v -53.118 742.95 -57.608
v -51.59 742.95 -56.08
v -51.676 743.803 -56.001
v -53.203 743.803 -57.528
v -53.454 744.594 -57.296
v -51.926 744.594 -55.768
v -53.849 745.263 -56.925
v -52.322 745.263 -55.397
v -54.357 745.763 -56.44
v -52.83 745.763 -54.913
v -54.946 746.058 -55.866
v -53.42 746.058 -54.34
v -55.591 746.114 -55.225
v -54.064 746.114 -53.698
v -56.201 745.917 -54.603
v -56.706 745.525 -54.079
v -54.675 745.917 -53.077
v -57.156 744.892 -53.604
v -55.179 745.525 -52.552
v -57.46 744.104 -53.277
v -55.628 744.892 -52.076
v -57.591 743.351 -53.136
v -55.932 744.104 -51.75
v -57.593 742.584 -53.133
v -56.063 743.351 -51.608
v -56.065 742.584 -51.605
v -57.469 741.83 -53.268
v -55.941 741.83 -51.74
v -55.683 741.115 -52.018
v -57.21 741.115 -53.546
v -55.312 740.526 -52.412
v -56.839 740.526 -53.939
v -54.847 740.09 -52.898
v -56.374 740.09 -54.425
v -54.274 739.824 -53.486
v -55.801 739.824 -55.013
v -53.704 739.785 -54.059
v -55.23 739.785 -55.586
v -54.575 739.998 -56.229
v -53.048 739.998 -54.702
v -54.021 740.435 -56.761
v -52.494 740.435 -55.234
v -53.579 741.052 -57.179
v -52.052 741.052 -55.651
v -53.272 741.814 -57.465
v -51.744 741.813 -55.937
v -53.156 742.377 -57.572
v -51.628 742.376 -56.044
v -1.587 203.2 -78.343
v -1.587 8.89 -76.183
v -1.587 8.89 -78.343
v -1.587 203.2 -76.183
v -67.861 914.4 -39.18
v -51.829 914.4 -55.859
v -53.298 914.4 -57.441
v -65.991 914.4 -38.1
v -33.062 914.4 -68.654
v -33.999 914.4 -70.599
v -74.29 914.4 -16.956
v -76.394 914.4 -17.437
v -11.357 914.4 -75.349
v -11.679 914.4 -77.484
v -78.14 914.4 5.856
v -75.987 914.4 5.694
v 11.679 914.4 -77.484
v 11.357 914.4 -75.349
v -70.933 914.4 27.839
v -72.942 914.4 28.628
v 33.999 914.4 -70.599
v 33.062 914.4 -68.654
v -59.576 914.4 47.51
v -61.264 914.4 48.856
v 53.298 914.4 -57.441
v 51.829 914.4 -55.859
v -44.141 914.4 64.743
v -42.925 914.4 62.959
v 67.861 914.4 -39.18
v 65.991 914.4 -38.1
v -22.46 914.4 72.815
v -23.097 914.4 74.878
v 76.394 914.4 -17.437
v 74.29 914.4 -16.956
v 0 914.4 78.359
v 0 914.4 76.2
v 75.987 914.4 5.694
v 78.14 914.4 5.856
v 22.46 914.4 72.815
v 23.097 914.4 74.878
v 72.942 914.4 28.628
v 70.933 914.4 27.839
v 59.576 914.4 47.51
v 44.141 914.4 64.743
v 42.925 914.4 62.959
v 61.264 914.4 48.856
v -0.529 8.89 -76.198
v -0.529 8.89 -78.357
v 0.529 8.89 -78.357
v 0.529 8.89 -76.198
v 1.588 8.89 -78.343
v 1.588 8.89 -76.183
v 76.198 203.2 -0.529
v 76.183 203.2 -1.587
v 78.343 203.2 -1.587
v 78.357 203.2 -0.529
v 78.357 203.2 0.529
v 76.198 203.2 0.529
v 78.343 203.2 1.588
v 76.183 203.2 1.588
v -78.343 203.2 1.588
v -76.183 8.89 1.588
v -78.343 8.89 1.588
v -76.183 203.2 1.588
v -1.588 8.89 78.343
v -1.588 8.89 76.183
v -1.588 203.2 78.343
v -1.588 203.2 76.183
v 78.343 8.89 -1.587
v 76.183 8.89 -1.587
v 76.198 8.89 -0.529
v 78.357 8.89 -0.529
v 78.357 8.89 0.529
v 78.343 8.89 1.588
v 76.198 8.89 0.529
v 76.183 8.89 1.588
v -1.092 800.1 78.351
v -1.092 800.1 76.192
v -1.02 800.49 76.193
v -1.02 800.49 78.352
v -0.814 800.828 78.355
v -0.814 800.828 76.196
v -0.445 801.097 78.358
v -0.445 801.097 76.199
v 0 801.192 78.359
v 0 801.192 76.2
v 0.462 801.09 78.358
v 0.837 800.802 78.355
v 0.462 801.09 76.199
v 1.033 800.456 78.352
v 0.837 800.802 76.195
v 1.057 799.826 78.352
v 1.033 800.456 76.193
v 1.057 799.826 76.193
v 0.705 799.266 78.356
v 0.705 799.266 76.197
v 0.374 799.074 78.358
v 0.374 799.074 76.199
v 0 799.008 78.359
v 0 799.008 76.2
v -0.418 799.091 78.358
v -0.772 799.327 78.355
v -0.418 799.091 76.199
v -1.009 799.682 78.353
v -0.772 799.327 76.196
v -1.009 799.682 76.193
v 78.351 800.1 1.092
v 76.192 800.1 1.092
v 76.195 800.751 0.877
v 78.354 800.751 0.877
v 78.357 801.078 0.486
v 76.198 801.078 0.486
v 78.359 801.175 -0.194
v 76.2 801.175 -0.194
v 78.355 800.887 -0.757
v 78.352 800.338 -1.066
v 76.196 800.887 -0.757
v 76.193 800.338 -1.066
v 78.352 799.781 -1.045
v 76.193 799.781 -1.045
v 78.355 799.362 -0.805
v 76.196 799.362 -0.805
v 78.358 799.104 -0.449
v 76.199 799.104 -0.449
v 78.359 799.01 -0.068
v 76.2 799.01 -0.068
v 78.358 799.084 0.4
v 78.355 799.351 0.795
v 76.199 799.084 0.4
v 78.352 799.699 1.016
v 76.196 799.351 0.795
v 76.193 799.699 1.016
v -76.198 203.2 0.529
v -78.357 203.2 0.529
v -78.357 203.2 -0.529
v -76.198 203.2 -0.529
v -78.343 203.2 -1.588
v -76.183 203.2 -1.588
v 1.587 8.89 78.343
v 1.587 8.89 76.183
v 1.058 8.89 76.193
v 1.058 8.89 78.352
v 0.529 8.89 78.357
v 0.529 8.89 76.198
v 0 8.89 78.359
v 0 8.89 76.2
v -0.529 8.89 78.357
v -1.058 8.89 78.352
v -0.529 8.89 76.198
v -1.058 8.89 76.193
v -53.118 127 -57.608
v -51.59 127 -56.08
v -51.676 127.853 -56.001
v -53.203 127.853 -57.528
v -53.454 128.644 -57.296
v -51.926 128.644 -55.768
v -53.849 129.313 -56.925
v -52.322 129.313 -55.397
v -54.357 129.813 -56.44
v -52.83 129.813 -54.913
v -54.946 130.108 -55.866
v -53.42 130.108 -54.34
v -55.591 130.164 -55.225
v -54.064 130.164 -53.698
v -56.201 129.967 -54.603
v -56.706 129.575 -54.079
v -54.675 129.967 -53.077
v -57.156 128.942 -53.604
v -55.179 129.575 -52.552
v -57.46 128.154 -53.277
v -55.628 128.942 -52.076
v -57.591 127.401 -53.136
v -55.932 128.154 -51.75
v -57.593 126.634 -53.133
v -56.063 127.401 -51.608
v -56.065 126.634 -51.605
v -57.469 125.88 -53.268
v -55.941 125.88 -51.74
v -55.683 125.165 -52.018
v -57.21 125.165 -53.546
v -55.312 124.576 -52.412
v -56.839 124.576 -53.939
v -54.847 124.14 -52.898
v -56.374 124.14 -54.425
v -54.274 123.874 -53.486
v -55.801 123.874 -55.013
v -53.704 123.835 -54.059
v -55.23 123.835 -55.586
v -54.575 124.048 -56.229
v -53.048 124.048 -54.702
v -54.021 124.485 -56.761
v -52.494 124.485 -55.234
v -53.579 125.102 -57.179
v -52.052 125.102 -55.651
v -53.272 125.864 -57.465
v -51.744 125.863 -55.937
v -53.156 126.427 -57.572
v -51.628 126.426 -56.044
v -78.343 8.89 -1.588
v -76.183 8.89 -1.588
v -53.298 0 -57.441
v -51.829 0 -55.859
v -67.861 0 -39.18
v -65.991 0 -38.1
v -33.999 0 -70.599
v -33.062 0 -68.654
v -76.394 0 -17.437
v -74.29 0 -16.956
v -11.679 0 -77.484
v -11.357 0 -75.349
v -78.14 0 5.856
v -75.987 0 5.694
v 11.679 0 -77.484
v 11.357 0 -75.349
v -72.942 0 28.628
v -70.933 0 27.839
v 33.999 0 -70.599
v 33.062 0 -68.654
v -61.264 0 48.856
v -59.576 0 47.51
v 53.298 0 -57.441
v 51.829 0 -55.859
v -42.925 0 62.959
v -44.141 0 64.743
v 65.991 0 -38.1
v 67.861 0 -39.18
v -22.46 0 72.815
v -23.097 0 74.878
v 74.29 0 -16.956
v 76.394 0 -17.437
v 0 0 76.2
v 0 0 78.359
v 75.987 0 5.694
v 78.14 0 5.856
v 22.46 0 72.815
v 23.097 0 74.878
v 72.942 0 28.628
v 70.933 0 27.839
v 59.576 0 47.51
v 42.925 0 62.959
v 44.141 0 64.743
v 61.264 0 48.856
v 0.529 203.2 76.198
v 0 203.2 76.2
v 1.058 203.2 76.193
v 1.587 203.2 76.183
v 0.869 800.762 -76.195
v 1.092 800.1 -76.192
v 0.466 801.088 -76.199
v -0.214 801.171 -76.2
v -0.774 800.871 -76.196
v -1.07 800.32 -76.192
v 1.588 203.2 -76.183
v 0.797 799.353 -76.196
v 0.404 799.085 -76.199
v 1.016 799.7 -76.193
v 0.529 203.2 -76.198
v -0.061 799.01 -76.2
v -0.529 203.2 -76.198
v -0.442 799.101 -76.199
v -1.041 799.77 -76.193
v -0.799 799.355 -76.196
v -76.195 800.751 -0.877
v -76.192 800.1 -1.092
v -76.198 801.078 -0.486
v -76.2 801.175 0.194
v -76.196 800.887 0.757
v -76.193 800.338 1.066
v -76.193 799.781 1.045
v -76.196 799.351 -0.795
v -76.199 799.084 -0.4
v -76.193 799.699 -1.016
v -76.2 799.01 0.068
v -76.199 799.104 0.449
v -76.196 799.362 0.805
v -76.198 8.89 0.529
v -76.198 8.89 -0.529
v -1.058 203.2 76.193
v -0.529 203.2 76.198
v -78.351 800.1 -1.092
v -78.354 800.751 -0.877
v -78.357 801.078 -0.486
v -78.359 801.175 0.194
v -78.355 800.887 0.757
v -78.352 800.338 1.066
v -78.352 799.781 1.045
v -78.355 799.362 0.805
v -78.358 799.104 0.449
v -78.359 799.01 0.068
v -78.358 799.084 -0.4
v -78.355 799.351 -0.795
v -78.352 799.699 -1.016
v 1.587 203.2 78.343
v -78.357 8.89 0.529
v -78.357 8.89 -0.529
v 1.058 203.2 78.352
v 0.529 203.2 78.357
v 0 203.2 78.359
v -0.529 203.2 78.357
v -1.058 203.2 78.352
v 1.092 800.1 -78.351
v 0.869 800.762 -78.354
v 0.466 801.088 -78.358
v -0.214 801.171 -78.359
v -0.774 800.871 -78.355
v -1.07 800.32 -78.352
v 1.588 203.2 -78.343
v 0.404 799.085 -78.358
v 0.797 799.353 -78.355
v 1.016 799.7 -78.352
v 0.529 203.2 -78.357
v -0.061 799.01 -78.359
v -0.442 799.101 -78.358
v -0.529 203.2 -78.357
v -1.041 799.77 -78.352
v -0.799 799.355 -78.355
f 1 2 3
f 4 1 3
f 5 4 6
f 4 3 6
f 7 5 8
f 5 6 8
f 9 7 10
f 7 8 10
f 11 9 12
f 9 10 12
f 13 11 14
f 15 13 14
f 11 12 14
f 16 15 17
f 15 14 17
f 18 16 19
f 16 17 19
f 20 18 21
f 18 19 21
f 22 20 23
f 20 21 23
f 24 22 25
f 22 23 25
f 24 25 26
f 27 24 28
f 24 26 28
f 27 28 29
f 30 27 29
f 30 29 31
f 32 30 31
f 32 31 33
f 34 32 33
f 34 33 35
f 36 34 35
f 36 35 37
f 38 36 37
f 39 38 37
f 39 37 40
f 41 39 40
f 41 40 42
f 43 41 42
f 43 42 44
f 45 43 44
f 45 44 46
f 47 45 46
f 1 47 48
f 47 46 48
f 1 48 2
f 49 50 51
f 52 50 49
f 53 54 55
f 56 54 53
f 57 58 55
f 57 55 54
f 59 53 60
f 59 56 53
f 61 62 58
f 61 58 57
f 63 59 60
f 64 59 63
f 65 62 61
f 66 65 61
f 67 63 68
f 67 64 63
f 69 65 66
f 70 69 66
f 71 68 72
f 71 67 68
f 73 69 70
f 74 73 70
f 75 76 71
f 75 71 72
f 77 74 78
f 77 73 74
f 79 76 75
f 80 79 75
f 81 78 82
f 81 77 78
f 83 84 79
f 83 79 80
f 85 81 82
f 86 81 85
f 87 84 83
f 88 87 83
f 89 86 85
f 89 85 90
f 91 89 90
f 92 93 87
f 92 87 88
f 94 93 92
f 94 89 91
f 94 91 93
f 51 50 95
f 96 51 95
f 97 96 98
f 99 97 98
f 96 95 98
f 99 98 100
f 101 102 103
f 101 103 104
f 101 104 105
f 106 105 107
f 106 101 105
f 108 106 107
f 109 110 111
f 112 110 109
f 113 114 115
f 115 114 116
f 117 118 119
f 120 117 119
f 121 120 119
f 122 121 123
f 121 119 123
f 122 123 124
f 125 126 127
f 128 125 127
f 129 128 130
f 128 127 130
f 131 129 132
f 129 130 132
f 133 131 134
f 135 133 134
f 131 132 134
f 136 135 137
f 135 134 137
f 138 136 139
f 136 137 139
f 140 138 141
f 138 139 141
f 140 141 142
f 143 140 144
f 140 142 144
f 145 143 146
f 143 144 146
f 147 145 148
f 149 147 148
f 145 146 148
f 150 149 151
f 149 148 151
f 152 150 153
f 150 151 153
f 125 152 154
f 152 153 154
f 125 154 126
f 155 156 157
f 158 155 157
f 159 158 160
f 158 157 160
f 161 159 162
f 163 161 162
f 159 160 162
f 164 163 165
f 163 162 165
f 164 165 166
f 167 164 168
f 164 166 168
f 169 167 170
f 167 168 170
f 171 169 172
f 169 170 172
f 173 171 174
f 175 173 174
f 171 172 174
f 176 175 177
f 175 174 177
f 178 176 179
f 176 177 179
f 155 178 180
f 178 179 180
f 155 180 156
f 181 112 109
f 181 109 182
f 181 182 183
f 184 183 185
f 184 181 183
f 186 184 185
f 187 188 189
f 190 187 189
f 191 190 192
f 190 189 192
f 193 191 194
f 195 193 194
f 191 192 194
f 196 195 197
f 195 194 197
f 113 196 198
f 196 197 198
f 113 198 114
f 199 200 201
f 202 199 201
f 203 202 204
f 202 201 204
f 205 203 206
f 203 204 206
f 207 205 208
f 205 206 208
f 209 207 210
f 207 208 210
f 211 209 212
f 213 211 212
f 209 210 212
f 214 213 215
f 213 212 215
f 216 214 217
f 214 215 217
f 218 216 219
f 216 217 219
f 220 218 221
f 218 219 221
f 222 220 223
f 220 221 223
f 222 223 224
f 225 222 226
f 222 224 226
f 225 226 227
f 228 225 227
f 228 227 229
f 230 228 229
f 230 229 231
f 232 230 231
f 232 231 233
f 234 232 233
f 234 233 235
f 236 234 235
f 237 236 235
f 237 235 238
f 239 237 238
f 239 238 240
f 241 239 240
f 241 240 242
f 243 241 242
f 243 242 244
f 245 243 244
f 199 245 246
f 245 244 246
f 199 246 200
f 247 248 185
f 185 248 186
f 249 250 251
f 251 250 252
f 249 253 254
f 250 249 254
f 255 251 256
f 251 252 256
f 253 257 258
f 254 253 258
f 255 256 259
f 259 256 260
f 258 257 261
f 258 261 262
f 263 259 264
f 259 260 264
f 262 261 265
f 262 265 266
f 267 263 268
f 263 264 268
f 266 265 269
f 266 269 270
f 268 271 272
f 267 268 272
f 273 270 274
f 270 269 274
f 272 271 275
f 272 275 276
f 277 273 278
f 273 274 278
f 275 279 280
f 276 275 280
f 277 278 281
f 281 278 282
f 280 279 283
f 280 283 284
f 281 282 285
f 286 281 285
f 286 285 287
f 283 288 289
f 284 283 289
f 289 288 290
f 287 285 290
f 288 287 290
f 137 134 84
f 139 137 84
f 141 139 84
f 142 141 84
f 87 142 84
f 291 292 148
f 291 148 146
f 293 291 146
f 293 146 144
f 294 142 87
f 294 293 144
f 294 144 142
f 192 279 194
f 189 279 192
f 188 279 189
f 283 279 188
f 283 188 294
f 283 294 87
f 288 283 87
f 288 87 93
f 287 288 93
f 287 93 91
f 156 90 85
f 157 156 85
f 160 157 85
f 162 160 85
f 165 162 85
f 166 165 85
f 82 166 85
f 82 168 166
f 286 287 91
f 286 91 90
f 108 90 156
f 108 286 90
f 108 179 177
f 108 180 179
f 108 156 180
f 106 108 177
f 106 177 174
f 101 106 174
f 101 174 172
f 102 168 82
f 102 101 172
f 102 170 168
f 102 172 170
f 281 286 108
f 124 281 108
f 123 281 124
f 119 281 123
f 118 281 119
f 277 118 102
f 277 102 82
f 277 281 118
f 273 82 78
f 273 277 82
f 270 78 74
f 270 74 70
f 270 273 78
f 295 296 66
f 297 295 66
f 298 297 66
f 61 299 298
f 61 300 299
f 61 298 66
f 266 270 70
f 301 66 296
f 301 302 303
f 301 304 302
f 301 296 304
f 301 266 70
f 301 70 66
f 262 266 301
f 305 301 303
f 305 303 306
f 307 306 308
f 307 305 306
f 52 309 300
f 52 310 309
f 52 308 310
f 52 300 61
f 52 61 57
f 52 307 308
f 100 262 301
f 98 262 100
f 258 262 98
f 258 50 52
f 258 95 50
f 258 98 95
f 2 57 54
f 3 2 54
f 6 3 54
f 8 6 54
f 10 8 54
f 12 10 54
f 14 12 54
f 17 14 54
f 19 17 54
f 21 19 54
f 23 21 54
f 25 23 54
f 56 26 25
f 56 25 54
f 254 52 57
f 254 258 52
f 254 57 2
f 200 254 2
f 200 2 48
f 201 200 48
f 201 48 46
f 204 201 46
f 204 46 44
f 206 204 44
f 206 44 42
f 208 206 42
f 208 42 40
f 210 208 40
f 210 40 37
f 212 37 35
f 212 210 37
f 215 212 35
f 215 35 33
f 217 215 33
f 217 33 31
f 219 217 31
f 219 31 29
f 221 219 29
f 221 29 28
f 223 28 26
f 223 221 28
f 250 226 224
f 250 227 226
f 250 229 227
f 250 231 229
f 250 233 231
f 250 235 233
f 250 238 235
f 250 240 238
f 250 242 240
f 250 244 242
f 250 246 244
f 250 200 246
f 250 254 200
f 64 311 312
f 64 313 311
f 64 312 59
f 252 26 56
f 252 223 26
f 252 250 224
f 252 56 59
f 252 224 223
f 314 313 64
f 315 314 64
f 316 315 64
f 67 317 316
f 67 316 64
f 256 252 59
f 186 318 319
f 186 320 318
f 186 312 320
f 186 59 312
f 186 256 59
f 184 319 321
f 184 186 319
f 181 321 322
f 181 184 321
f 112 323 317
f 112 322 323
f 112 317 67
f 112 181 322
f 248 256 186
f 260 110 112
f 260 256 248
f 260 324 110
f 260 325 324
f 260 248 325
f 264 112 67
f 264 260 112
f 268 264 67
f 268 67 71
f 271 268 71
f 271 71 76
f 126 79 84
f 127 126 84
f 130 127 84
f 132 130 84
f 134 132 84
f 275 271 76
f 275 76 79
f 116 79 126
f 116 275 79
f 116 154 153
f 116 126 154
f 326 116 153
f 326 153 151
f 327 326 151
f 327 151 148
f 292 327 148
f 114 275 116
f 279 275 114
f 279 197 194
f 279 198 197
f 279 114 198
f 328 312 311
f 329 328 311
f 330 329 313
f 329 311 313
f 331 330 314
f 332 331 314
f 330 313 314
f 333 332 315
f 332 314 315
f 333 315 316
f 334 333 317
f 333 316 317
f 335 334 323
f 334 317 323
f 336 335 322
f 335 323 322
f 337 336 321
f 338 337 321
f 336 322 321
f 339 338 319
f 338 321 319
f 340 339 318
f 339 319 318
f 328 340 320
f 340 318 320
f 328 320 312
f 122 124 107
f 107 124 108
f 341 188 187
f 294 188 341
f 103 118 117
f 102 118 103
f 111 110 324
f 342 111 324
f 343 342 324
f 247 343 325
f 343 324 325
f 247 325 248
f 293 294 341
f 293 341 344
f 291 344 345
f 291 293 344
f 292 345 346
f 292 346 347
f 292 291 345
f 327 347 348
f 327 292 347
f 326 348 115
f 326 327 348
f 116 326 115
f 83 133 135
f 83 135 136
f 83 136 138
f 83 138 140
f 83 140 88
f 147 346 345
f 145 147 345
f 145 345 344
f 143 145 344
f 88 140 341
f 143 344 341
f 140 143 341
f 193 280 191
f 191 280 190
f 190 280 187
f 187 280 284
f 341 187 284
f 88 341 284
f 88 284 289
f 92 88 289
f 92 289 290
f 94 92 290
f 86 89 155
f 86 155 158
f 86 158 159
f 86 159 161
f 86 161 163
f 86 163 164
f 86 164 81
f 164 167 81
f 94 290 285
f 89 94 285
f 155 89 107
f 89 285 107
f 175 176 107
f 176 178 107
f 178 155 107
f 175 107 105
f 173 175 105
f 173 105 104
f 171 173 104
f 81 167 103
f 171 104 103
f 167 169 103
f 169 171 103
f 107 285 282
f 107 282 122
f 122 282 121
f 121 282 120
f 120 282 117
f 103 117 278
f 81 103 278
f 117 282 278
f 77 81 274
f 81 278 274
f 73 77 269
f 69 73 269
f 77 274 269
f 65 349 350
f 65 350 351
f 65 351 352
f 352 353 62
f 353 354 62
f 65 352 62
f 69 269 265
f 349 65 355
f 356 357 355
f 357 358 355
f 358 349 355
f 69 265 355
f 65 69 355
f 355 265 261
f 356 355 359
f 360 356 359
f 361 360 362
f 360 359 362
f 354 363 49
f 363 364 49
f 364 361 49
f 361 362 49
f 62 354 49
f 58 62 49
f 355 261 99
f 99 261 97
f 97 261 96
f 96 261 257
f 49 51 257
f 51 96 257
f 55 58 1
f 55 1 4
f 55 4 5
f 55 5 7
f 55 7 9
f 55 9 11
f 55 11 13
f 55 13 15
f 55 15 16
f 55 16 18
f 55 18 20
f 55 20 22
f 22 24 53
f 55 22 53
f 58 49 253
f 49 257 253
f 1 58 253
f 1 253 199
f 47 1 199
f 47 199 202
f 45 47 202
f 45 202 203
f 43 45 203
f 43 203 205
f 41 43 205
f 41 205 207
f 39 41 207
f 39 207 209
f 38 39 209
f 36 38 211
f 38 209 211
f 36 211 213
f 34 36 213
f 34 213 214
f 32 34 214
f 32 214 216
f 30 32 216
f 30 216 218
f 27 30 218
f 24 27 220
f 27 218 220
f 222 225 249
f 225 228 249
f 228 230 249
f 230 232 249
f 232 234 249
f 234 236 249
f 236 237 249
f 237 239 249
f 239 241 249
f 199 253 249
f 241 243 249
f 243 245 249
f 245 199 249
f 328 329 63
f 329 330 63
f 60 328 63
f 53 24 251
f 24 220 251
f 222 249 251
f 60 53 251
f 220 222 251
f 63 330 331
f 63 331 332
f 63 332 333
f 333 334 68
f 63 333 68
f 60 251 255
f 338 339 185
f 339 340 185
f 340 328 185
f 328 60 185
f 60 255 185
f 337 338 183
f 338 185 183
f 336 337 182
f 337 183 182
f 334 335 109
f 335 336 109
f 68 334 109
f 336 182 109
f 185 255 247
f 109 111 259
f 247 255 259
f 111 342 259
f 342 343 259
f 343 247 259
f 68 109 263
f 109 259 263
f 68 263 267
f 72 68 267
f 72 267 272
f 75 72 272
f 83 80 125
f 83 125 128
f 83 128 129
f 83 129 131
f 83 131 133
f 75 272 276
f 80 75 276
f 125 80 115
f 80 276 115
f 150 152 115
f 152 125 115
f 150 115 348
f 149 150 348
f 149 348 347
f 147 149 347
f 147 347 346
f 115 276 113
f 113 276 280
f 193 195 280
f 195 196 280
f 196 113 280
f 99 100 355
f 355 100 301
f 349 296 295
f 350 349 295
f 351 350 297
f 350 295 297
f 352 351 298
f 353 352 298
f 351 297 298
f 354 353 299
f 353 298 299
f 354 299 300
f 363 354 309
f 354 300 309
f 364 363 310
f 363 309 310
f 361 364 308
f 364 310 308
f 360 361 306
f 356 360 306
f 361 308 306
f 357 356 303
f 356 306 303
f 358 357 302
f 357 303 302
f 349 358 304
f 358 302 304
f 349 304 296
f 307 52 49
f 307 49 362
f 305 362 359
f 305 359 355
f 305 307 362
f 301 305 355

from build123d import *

# Parameters (mm, degrees)
SKETCH1_R                 = 78.359
SKETCH1_R_2               = 76.2
BOSS_EXTRUDE1_DEPTH       = 914.4
FIN_SLOTS_DEPTH           = 922.090454712
CIRPATTERN1_COUNT         = 4
SKETCH3_R                 = 3.175
RAIL_BUTTONS_DEPTH        = 922.090454712
SKETCH2_4_R               = 1.0922
SHEAR_SCREW_HOLES_DEPTH   = 922.090454829
SHEAR_SCREW_PATTERN_COUNT = 4


with BuildPart() as part:
    # Sketch1 → Boss-Extrude1 (new body)
    with BuildSketch(Plane(origin=(0, 0, 0), x_dir=(1, 0, 0), z_dir=(0, 1, 0))):
        Circle(SKETCH1_R)
        Circle(SKETCH1_R_2, mode=Mode.SUBTRACT)
    extrude(amount=BOSS_EXTRUDE1_DEPTH)

    # Sketch2 → Fin Slots (cut, through all)
    with BuildSketch(Plane(origin=(0, 0, 0), x_dir=(0, 0, -1), z_dir=(1, 0, 0))):
        Polygon((0, 8.89), (1.5875, 8.89), (1.5875, 203.2), (-1.5875, 203.2), (-1.5875, 8.89), align=None)
    fin_slots = extrude(amount=-FIN_SLOTS_DEPTH, mode=Mode.SUBTRACT)

    # CirPattern1: Fin Slots ×4 about axis
    cirpattern1_axis = Axis((0, 0, 0), (0, 1, 0))
    for i in range(1, CIRPATTERN1_COUNT):
        add(fin_slots.rotate(cirpattern1_axis, i * 360 / CIRPATTERN1_COUNT), mode=Mode.SUBTRACT)

    # Sketch3 → Rail Buttons (cut, through all)
    with BuildSketch(Plane(origin=(0, 0, 0), x_dir=(0.7071067811865477, 0, -0.7071067811865475), z_dir=(0.7071067811865475, 0, 0.7071067811865477))):
        with Locations((0, 127)):
            Circle(SKETCH3_R)
        with Locations((0, 742.95)):
            Circle(SKETCH3_R)
    extrude(amount=-RAIL_BUTTONS_DEPTH, mode=Mode.SUBTRACT)

    # Sketch2_4 → Shear Screw Holes (cut, through all)
    with BuildSketch(Plane(origin=(0, 0, 0), x_dir=(0, 0, -1), z_dir=(1, 0, 0))):
        with Locations((0, 800.1)):
            Circle(SKETCH2_4_R)
    shear_screw_holes = extrude(amount=-SHEAR_SCREW_HOLES_DEPTH, mode=Mode.SUBTRACT)

    # Shear Screw Pattern: Shear Screw Holes ×4 about axis
    shear_screw_pattern_axis = Axis((0, 914.4, 0), (0, -1, 0))
    for i in range(1, SHEAR_SCREW_PATTERN_COUNT):
        add(shear_screw_holes.rotate(shear_screw_pattern_axis, i * 360 / SHEAR_SCREW_PATTERN_COUNT), mode=Mode.SUBTRACT)


solid = part.part
